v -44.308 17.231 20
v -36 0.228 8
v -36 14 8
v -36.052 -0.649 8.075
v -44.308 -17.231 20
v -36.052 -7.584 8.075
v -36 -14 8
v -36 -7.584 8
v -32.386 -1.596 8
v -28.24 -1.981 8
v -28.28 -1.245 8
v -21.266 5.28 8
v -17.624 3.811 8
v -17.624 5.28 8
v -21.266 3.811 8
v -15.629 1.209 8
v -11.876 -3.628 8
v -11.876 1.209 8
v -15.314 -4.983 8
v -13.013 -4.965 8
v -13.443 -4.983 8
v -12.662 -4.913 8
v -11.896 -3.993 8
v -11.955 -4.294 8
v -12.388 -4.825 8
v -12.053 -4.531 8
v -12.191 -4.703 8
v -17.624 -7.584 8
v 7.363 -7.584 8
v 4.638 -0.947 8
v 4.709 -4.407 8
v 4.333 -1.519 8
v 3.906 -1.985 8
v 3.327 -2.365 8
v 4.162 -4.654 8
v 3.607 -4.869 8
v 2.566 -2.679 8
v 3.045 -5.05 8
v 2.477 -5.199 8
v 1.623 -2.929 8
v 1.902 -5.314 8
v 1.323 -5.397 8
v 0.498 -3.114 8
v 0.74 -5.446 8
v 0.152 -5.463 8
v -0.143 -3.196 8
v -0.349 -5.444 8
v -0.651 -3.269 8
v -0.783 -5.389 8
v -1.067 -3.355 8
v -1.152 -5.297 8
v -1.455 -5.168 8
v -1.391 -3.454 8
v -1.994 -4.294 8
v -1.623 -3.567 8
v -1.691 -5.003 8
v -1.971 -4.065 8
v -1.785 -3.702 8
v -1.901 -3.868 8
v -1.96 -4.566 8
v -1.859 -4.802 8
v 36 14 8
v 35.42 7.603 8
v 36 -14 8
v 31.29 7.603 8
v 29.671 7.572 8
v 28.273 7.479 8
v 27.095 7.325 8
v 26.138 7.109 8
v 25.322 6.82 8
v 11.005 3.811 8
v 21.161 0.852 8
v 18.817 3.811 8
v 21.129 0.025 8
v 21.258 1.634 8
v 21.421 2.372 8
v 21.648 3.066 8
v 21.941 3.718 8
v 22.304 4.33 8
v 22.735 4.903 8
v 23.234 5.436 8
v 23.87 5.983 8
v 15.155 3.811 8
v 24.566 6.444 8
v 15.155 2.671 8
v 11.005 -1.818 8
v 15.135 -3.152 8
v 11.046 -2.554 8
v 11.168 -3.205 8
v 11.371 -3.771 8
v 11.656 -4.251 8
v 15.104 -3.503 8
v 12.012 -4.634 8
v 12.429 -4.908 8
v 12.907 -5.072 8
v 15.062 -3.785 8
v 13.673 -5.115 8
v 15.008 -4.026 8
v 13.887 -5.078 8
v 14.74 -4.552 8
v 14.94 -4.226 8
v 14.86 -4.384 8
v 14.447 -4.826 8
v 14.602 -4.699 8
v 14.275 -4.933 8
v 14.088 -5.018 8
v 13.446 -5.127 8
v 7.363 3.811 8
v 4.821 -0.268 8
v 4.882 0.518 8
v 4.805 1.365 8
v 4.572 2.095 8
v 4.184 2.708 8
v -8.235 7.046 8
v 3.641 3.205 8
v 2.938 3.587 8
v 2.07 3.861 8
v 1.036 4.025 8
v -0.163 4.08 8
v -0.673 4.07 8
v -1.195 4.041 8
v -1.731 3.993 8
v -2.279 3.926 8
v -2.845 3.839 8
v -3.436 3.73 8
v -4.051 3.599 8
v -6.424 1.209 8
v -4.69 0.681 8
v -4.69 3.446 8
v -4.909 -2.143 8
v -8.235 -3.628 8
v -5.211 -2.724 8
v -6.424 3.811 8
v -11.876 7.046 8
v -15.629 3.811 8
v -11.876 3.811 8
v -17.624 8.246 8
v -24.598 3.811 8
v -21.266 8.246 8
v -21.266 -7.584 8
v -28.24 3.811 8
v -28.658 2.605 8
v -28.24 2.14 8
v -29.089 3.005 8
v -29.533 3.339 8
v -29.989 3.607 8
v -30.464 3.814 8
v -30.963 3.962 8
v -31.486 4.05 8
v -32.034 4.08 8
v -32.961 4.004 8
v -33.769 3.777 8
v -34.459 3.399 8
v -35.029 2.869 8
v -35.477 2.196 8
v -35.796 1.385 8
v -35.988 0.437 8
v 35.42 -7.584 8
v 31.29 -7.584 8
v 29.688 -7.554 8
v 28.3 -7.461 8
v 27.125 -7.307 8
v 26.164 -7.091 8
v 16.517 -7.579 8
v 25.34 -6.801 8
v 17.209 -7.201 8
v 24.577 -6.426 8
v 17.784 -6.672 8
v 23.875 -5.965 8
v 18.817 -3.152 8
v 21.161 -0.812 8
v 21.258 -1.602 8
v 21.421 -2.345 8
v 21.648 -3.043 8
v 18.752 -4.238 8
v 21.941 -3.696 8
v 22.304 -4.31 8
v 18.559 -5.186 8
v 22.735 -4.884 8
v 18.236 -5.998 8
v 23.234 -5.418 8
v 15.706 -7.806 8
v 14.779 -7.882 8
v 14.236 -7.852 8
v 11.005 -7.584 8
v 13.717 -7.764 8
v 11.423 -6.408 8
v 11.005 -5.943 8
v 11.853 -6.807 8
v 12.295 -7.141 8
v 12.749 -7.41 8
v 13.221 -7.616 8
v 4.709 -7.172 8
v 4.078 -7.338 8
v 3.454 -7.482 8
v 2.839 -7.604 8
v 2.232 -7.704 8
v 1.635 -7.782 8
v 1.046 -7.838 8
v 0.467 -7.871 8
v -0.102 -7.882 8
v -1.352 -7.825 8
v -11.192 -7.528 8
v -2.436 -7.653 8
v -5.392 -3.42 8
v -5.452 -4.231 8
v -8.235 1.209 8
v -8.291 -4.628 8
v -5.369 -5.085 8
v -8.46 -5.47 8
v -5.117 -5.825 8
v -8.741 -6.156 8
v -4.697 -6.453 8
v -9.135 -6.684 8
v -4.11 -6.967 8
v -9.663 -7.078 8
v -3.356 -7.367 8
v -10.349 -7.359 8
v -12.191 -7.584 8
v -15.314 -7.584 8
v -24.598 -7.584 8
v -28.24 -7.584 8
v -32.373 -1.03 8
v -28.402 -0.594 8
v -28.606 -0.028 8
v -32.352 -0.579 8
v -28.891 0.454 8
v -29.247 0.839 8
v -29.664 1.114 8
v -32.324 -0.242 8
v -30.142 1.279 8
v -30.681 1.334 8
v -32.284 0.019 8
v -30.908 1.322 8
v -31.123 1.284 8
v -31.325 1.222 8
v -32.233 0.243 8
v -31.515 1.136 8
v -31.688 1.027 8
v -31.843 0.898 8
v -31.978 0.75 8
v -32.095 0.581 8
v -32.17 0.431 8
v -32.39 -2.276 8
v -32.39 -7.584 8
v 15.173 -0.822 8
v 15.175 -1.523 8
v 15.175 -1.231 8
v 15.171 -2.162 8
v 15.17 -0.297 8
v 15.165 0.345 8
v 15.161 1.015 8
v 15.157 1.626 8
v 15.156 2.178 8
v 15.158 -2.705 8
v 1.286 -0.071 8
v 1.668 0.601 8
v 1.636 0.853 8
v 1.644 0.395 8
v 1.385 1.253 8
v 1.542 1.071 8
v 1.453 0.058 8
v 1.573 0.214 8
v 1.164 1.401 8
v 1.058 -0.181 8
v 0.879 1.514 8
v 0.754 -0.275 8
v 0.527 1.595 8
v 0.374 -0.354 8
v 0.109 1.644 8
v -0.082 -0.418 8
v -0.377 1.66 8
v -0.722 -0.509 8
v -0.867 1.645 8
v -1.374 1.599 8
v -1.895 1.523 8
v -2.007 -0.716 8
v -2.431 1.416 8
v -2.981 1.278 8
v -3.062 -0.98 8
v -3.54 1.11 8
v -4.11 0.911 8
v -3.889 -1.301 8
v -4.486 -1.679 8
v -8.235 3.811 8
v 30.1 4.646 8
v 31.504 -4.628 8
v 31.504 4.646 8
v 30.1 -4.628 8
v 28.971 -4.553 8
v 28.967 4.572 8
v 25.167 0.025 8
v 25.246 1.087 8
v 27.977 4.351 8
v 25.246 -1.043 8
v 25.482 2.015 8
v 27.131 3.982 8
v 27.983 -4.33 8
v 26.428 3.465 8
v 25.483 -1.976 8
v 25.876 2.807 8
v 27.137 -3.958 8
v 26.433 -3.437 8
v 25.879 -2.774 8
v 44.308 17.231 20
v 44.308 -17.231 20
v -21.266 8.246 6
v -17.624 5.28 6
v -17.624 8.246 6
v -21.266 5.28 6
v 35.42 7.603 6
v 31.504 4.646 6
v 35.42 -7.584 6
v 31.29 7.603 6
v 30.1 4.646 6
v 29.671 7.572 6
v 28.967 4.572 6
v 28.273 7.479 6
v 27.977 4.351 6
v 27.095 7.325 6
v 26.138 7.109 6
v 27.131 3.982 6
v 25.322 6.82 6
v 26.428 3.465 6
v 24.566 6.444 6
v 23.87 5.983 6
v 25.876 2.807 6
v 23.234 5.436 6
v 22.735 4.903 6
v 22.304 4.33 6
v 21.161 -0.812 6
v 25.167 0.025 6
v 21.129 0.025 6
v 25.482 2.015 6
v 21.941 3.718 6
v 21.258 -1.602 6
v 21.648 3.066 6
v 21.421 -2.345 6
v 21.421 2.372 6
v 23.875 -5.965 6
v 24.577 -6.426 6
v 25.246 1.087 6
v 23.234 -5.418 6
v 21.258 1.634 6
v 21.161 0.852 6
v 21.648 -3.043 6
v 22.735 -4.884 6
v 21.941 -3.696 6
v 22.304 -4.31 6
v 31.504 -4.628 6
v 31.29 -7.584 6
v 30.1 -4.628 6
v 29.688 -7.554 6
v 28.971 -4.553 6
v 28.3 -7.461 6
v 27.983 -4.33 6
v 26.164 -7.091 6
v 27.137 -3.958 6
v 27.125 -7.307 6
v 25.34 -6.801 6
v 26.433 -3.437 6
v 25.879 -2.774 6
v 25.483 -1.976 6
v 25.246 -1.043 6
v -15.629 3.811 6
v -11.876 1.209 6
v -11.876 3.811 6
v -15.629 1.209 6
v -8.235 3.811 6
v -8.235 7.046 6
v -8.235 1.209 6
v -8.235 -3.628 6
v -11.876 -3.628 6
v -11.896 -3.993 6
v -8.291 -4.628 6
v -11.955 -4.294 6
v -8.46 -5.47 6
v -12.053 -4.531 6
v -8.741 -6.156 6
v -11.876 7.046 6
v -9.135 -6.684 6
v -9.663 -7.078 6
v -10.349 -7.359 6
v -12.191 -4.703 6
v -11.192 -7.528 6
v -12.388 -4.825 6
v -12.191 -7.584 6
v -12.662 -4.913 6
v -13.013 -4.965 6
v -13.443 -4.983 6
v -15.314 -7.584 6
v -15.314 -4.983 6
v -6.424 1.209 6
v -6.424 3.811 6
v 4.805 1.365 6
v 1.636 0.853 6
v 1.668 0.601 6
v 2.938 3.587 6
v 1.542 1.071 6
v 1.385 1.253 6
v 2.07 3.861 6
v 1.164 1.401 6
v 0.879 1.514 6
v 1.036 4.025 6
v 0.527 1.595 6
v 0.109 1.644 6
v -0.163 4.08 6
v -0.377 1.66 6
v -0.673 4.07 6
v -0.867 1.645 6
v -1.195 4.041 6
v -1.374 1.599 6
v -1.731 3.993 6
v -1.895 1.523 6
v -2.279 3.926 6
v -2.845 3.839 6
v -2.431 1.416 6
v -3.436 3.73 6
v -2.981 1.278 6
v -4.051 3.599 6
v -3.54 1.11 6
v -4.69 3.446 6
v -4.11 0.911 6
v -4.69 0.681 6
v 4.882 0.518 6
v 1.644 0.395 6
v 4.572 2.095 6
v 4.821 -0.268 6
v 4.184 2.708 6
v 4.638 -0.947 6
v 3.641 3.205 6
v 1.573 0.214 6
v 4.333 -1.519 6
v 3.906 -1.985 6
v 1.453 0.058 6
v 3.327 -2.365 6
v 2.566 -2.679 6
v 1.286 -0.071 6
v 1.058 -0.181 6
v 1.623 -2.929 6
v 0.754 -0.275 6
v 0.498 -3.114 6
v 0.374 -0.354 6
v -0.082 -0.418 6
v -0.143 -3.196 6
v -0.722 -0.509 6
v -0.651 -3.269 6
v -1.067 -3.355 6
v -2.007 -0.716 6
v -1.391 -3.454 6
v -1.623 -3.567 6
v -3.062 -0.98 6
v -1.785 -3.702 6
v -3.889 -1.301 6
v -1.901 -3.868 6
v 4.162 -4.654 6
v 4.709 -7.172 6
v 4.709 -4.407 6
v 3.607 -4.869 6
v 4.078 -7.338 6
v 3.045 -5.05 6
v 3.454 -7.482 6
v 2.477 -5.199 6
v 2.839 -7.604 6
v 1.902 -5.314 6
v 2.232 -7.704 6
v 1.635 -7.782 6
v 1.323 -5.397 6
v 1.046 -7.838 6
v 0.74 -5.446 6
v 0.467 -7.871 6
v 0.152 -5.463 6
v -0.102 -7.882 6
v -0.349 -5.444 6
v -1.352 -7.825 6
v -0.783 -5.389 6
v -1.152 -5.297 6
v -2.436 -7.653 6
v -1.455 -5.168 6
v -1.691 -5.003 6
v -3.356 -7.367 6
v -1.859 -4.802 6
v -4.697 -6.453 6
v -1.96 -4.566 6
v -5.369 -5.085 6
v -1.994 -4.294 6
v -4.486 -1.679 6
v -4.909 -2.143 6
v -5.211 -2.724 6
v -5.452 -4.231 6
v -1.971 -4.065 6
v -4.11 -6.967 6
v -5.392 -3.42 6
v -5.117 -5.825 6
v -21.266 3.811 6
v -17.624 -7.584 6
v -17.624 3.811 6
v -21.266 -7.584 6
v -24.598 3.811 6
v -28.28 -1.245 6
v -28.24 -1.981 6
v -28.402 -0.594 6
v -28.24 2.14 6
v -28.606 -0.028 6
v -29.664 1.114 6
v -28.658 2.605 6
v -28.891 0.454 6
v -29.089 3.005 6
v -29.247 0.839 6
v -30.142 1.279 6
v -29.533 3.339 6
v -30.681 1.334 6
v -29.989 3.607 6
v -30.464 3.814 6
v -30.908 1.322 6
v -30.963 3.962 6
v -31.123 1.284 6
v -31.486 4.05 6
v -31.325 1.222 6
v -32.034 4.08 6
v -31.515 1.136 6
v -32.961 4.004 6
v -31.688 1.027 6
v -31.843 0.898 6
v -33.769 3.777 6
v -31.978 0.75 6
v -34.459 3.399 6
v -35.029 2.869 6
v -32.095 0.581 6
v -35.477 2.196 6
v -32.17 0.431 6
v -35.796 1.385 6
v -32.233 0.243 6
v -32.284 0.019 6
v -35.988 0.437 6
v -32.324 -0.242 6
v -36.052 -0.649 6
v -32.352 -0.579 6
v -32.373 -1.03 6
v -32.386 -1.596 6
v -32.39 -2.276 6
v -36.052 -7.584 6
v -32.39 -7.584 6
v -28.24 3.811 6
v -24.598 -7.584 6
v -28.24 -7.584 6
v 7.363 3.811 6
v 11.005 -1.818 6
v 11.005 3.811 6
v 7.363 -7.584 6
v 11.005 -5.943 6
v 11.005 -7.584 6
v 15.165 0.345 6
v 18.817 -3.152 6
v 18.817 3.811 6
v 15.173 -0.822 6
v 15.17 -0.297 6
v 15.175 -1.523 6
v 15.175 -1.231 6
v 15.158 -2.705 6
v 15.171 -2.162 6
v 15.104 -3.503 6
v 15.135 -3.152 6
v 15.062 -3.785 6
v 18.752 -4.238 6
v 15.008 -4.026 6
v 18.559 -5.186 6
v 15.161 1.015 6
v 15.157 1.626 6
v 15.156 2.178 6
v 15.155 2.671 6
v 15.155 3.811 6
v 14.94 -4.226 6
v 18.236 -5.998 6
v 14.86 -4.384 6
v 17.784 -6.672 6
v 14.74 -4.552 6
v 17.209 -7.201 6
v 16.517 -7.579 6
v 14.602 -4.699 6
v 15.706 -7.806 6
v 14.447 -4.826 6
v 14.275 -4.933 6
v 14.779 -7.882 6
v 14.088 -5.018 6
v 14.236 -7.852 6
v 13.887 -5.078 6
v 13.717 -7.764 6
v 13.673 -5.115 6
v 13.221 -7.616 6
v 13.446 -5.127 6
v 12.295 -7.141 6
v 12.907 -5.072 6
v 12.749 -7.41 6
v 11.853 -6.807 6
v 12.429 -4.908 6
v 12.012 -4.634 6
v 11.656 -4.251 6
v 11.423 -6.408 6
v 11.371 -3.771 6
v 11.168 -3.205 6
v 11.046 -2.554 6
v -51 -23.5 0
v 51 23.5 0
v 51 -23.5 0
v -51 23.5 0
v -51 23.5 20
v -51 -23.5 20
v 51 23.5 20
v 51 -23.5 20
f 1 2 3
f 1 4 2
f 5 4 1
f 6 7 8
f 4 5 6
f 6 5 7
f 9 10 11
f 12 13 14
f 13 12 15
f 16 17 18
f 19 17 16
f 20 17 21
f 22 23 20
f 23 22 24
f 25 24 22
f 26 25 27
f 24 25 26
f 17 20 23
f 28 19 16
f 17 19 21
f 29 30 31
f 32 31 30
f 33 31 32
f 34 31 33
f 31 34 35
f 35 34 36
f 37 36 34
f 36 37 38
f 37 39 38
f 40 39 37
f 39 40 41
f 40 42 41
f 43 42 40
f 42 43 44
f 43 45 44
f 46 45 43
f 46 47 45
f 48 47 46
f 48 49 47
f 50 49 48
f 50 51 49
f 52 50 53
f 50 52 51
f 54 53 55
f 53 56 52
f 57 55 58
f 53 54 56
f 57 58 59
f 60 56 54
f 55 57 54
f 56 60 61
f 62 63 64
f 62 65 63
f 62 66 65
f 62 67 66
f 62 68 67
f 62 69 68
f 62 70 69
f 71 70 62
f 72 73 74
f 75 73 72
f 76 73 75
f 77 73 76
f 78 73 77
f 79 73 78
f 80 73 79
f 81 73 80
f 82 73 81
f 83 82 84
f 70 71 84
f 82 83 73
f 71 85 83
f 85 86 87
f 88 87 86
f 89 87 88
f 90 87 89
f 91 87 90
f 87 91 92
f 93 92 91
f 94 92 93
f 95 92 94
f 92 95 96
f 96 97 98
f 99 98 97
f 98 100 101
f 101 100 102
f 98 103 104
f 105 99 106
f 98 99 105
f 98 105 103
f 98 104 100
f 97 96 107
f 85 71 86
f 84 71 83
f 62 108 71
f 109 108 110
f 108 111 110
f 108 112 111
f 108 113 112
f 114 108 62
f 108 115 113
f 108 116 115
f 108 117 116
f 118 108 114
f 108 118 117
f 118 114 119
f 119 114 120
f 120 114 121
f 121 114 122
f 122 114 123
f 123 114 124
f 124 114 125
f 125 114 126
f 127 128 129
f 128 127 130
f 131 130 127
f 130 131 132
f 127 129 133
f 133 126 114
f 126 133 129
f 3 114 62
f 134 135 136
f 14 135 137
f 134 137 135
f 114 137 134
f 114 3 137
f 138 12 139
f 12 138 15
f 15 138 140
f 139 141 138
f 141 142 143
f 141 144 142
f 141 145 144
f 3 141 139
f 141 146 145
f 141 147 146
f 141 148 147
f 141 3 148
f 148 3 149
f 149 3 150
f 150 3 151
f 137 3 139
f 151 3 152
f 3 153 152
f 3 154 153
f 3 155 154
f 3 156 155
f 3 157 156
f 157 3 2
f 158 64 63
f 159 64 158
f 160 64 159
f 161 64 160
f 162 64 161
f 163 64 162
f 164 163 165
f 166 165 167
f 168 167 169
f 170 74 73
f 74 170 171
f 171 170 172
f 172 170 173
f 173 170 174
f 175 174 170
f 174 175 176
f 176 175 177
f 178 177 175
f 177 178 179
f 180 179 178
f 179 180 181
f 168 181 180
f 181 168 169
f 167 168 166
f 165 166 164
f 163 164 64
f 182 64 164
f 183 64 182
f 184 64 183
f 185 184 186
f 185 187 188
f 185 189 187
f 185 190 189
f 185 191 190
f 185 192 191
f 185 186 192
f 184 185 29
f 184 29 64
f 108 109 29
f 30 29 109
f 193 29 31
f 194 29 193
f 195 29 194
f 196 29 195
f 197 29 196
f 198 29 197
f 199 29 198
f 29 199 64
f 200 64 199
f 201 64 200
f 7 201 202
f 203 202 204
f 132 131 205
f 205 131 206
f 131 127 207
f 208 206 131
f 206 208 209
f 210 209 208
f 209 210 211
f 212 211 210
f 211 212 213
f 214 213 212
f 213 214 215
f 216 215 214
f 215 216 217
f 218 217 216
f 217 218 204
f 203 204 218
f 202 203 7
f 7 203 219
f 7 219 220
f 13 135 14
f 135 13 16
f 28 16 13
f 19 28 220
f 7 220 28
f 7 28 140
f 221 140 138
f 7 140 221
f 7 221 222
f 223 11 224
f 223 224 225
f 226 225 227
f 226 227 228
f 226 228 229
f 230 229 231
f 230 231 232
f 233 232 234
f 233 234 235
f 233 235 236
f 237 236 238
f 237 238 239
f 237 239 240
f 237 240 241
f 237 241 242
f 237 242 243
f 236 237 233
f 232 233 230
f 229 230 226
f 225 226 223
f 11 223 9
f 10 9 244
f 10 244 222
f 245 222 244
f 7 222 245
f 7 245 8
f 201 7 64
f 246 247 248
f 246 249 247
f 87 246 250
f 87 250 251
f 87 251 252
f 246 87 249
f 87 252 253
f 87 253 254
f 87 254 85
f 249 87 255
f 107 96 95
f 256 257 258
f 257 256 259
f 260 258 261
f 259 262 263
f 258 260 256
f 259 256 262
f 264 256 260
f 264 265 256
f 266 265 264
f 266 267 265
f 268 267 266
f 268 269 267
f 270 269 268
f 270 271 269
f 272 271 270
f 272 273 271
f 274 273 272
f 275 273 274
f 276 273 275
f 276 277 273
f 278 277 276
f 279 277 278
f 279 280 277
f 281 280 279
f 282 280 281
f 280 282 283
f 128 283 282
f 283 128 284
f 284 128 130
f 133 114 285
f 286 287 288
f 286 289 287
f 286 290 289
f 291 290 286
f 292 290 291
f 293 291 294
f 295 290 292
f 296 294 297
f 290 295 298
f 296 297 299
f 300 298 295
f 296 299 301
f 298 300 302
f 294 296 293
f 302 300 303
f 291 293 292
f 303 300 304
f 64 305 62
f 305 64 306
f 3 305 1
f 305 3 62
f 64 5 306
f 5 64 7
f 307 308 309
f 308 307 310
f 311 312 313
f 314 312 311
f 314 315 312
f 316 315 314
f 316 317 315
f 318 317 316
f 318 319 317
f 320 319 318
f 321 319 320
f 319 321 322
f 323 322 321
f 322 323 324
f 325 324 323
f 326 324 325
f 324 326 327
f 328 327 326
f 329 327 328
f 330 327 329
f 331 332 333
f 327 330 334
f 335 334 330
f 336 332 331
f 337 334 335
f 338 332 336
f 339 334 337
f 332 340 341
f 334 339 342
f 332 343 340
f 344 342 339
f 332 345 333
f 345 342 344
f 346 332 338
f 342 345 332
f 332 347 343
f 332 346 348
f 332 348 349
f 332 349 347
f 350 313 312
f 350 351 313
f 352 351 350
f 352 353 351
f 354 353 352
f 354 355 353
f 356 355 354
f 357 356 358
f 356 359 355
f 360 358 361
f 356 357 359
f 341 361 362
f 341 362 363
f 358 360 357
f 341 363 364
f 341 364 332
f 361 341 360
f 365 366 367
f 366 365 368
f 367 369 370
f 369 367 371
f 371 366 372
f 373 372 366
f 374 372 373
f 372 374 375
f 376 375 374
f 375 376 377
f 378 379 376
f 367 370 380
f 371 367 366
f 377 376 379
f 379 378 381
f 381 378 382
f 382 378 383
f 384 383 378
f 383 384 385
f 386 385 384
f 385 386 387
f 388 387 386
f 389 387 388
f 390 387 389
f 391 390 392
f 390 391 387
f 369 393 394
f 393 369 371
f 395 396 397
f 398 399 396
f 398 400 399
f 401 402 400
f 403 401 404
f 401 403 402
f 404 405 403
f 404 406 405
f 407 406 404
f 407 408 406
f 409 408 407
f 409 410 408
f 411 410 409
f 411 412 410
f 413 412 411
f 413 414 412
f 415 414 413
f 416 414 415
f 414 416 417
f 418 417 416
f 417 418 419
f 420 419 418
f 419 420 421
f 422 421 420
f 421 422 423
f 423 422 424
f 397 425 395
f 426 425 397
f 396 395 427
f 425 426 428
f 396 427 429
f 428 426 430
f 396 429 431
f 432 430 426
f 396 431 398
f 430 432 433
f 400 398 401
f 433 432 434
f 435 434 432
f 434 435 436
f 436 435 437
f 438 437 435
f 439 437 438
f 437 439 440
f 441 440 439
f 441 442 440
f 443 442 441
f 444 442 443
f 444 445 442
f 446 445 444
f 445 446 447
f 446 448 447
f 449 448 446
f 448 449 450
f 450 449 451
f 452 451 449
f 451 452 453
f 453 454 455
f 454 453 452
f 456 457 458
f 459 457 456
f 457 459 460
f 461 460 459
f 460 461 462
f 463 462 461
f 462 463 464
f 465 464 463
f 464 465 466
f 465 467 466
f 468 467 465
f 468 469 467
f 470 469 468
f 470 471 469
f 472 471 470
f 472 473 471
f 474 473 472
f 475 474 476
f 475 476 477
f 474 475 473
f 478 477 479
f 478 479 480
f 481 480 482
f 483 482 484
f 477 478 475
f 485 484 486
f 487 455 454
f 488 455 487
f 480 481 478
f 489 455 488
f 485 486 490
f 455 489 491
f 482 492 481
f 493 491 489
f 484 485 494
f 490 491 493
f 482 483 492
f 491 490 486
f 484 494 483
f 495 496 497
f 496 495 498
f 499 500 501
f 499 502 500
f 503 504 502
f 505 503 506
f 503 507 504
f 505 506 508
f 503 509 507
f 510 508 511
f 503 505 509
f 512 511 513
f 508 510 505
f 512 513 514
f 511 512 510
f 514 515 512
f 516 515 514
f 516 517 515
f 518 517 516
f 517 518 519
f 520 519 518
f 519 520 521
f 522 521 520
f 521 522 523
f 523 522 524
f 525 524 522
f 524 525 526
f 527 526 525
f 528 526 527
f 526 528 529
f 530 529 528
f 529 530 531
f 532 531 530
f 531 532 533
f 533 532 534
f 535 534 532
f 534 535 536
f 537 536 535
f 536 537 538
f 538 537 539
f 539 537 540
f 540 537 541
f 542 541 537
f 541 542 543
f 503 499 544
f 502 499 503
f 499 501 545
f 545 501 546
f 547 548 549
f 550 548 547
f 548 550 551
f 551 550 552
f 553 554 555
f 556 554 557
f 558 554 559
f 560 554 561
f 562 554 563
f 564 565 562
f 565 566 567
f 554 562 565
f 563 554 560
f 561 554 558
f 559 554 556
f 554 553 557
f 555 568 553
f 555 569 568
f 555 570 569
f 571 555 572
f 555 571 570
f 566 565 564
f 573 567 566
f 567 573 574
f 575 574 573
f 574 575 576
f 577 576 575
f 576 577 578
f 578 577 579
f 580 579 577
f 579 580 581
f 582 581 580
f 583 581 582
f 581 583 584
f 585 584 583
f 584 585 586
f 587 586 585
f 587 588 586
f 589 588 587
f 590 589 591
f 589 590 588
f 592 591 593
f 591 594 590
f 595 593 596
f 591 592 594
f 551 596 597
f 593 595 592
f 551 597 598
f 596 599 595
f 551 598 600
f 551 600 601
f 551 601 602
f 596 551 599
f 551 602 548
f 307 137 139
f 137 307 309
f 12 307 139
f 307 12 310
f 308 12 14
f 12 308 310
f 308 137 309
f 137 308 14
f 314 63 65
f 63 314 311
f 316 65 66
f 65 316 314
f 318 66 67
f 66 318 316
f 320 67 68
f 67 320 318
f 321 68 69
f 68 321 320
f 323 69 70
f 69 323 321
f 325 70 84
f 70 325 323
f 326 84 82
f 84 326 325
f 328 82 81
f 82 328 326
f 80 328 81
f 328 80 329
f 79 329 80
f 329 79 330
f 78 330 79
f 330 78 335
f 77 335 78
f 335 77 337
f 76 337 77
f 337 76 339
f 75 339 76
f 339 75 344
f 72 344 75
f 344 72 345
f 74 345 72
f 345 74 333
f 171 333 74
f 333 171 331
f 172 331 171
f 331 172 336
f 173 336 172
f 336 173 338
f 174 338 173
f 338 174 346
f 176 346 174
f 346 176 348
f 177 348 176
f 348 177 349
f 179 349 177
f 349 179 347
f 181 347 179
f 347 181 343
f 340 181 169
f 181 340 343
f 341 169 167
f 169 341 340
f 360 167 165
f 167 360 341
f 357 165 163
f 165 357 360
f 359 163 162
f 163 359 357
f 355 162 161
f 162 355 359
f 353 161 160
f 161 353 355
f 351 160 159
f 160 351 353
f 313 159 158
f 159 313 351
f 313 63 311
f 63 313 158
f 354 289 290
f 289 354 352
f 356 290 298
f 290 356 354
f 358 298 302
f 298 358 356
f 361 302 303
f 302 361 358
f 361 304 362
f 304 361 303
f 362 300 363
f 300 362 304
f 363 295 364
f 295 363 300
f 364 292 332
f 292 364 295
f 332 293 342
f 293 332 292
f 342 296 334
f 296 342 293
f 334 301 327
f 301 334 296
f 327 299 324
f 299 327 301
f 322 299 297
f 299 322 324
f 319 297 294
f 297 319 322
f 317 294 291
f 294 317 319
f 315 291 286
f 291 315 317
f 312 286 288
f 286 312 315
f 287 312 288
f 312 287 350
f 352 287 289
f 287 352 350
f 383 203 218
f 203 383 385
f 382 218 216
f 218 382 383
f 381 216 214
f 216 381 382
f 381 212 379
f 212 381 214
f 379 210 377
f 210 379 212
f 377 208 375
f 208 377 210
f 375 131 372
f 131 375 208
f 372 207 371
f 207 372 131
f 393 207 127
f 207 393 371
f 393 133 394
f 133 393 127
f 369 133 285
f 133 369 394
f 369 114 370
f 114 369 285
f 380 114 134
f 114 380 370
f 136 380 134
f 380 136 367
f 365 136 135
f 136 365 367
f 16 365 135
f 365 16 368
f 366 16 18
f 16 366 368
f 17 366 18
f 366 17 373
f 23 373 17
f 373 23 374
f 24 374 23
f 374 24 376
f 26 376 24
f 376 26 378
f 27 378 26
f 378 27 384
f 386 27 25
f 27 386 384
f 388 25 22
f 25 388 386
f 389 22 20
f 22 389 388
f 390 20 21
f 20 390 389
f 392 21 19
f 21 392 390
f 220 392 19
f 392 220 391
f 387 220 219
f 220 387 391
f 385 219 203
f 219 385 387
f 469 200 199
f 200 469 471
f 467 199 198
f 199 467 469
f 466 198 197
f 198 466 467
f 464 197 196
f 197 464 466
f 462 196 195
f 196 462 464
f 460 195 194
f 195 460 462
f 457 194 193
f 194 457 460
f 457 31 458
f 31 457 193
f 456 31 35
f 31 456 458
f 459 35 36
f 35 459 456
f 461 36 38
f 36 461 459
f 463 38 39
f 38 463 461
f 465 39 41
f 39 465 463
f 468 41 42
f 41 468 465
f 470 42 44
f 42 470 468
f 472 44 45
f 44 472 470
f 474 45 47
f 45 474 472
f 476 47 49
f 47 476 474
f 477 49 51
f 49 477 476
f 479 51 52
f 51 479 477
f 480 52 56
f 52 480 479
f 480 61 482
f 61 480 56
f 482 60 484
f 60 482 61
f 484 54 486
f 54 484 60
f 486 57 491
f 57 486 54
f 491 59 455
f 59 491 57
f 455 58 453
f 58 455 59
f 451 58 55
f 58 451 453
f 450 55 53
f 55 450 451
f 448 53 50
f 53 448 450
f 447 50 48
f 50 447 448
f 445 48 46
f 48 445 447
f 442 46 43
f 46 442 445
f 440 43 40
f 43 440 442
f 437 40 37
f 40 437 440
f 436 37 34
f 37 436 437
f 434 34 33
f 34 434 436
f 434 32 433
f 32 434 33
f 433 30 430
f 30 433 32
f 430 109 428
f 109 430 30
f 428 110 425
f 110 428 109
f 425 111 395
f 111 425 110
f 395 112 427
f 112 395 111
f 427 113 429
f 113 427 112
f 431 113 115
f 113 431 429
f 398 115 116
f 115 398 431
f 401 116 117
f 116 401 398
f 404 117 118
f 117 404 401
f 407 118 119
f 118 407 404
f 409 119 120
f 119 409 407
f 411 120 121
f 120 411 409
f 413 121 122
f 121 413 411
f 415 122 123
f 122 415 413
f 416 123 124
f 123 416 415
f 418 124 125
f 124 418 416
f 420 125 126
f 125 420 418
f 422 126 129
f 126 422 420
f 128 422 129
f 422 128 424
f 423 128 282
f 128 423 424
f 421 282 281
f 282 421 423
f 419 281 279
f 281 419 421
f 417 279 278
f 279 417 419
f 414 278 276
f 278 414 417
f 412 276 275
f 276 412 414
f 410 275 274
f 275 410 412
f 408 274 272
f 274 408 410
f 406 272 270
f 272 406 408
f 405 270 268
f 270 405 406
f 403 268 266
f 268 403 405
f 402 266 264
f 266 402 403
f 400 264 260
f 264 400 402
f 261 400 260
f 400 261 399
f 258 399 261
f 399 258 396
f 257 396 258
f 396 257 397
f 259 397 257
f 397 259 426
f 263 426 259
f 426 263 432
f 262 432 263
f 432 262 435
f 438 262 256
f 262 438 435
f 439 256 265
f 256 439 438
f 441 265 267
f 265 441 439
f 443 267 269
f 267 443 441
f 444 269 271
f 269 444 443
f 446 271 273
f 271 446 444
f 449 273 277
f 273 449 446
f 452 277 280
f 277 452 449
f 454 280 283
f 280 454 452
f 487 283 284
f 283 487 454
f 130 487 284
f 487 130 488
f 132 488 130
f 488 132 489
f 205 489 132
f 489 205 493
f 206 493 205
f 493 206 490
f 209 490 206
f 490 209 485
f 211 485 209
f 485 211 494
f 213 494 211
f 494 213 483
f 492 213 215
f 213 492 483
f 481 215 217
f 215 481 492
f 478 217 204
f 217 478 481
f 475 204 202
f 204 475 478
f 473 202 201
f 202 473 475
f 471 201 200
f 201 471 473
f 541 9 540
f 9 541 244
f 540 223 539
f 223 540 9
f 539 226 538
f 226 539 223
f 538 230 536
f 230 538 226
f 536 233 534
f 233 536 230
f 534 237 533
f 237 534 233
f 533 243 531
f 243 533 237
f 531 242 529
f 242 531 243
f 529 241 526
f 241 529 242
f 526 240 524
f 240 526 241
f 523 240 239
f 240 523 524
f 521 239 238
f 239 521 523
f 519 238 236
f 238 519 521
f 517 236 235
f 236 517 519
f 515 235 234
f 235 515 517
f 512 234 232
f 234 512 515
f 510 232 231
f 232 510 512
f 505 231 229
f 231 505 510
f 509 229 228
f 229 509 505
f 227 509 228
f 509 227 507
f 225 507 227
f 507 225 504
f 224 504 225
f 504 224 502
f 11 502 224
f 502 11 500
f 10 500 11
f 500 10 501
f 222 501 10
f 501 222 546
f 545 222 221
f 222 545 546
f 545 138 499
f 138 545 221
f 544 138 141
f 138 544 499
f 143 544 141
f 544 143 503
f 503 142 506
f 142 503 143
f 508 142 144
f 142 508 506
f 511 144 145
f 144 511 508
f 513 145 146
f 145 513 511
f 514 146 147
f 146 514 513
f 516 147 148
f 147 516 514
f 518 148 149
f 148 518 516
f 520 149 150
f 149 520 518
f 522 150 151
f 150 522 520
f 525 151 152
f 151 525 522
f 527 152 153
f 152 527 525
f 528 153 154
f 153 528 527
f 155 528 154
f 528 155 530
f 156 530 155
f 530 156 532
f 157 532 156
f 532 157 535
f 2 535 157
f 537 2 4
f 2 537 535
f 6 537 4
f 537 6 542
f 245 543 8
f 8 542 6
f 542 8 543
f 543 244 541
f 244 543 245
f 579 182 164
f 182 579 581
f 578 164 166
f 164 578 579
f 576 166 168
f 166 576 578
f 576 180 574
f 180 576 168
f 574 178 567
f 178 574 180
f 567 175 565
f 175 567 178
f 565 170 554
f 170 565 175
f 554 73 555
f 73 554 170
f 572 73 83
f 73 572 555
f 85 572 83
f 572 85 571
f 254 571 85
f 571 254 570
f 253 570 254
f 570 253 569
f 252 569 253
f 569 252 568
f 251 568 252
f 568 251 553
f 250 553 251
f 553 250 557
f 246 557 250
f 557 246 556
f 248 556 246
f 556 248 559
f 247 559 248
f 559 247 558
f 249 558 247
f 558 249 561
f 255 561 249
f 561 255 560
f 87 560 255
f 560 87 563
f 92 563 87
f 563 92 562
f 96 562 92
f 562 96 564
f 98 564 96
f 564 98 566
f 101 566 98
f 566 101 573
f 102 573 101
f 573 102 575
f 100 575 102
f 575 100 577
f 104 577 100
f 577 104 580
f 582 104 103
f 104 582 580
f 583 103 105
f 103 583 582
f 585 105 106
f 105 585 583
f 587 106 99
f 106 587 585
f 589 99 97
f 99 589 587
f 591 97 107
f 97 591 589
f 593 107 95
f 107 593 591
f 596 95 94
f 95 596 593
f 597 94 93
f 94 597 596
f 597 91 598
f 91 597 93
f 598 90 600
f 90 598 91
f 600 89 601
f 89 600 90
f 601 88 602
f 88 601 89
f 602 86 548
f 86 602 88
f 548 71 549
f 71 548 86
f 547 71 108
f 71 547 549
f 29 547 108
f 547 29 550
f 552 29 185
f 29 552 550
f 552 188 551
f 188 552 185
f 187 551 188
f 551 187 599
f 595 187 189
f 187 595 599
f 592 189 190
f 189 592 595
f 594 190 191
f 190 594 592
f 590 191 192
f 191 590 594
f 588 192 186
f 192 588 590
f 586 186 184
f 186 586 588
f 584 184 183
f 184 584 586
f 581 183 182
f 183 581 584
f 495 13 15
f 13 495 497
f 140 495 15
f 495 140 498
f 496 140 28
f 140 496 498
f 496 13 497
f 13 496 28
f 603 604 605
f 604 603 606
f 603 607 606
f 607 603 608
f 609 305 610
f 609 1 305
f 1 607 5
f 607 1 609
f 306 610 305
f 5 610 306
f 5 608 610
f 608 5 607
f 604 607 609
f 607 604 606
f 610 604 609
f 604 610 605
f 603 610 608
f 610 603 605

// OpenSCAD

labelString = "Dustin";
fast        = 1;   // [0:Smoothed Text, 1:Fast Render]
pourHeight  = 35;  // [5:1:200]
pourWidth   = 90;  // [5:1:300]
pourThick   = 12;  // [1:1:150]
taper       = 0.8; // [0.1:0.01:1.0]
labelDepth  = 2;   // [0.5:0.1:25]
labelSmooth = 0.5; // [0.2:0.1:2.0]
fontSize    = 15;  // [2:1:80]
moldWall    = 6;   // [1:1:12]
moldWidth   = pourWidth  + moldWall*2;
moldHeight  = pourHeight + moldWall*2;
floorThick  = moldWall   + labelDepth;
moldThick   = pourThick  + floorThick;
texDepth    = 2*1;
texLine     = 1*1;
texC2C      = 8*1;
texWidth    = texC2C/sin(60)-texLine;
extra       = 1*1;

difference()
  { moldBlock();
    union()
      { pourCavity();
        if ( fast > 0.5 )
          fastLetters();
        if ( fast <= 0.5 )
          { letters();
            texture();
          }
      }
  }

module pourCavity()
{ translate( [0,0,floorThick] )
    linear_extrude( height=pourThick+extra, scale=1/taper )
      translate( [-pourWidth*taper/2,-pourHeight*taper/2] )
        square( [pourWidth*taper,pourHeight*taper] );
}

module moldBlock()
{ translate( [-moldWidth/2,-moldHeight/2] )
    linear_extrude( moldThick )
      square( [moldWidth,moldHeight] );
}

module letters()
{ font1 = "Baloo Bhai:style=Bold"; // here you can select other font type
  $fn=8;
  translate( [0,0,moldWall] )
    minkowski()
      { linear_extrude( height=(labelDepth+extra-labelSmooth) )
          fillet( labelSmooth )
            rounding( labelSmooth )
              rotate( [0,180,0] )
                text( labelString, font = font1, size = fontSize, direction = "ltr", spacing = 1, halign="center", valign="center" );
          
        sphere( labelSmooth );
      }
}

module fastLetters()
{ font1 = "Baloo Bhai:style=Bold"; // here you can select other font type
  translate( [0,0,moldWall] )
    linear_extrude( height=(labelDepth+extra-labelSmooth) )
      rotate( [0,180,0] )
        text( labelString, font = font1, size = fontSize, direction = "ltr", spacing = 1, halign="center", valign="center" );
}

// Waffle like cuts to make removal from build plate easier
module texture()
{ wid = moldWidth;
  hei = moldHeight;
  translate( [-wid/2,-hei/2] )
  {  
  vo = sin(60)*2;
  for ( i = [wid/2:texC2C:wid] )
    for ( j = [0:texC2C*vo:hei+texC2C*vo] )
      translate( [i,j,0] )
        textureCone( texDepth );
  for ( i = [wid/2+texC2C/2:texC2C:wid] )
    for ( j = [texC2C*vo/2:texC2C*vo:hei+texC2C*vo] )
      translate( [i,j,0] )
        textureCone( texDepth );
    
  for ( i = [wid/2:-texC2C:0] )
    for ( j = [0:texC2C*vo:hei+texC2C*vo] )
      translate( [i,j,0] )
        textureCone( texDepth );
  for ( i = [wid/2-texC2C/2:-texC2C:0] )
    for ( j = [texC2C*vo/2:texC2C*vo:hei+texC2C*vo] )
      translate( [i,j,0] )
        textureCone( texDepth );
  }
}

module textureCone( h=1 )
{ translate( [0,0,-0.001] )
    linear_extrude( height=h,scale=0.5 )
      polygon(points=[[cos(030)*texWidth/2,sin(030)*texWidth/2 ],
                      [cos(090)*texWidth/2,sin(090)*texWidth/2 ],
                      [cos(150)*texWidth/2,sin(150)*texWidth/2 ],
                      [cos(210)*texWidth/2,sin(210)*texWidth/2 ],
                      [cos(270)*texWidth/2,sin(270)*texWidth/2 ],
                      [cos(330)*texWidth/2,sin(330)*texWidth/2 ]],
              paths =[[0,1,2,3,4,5,0]] );
    
}

// Copyright (c) 2013 Oskar Linde. All rights reserved.
// License: BSD
//
// This library contains basic 2D morphology operations
//
// outset(d=1)            - creates a polygon at an offset d outside a 2D shape
// inset(d=1)             - creates a polygon at an offset d inside a 2D shape
// fillet(r=1)            - adds fillets of radius r to all concave corners of a 2D shape
// rounding(r=1)          - adds rounding to all convex corners of a 2D shape
// shell(d,center=false)  - makes a shell of width d along the edge of a 2D shape
//                        - positive values of d places the shell on the outside
//                        - negative values of d places the shell on the inside
//                        - center=true and positive d places the shell centered on the edge

module outset(d=1) {
	// Bug workaround for older OpenSCAD versions
	if (version_num() < 20130424) render() outset_extruded(d) children();
	else minkowski() {
		circle(r=d);
		children();
	}
}

module outset_extruded(d=1) {
   projection(cut=true) minkowski() {
        cylinder(r=d);
        linear_extrude(center=true) children();
   }
}

module inset(d=1) {
	 render() inverse() outset(d=d) inverse() children();
}

module fillet(r=1) {
	inset(d=r) render() outset(d=r) children();
}

module rounding(r=1) {
	outset(d=r) inset(d=r) children();
}

module shell(d,center=false) {
	if (center && d > 0) {
		difference() {
			outset(d=d/2) children();
			inset(d=d/2) children();
		}
	}
	if (!center && d > 0) {
		difference() {
			outset(d=d) children();
			children();
		}
	}
	if (!center && d < 0) {
		difference() {
			children();
			inset(d=-d) children();
		}
	}
	if (d == 0) children();
}


// Below are for internal use only

module inverse() {
	difference() {
		square(1e5,center=true);
		children();
	}
}
